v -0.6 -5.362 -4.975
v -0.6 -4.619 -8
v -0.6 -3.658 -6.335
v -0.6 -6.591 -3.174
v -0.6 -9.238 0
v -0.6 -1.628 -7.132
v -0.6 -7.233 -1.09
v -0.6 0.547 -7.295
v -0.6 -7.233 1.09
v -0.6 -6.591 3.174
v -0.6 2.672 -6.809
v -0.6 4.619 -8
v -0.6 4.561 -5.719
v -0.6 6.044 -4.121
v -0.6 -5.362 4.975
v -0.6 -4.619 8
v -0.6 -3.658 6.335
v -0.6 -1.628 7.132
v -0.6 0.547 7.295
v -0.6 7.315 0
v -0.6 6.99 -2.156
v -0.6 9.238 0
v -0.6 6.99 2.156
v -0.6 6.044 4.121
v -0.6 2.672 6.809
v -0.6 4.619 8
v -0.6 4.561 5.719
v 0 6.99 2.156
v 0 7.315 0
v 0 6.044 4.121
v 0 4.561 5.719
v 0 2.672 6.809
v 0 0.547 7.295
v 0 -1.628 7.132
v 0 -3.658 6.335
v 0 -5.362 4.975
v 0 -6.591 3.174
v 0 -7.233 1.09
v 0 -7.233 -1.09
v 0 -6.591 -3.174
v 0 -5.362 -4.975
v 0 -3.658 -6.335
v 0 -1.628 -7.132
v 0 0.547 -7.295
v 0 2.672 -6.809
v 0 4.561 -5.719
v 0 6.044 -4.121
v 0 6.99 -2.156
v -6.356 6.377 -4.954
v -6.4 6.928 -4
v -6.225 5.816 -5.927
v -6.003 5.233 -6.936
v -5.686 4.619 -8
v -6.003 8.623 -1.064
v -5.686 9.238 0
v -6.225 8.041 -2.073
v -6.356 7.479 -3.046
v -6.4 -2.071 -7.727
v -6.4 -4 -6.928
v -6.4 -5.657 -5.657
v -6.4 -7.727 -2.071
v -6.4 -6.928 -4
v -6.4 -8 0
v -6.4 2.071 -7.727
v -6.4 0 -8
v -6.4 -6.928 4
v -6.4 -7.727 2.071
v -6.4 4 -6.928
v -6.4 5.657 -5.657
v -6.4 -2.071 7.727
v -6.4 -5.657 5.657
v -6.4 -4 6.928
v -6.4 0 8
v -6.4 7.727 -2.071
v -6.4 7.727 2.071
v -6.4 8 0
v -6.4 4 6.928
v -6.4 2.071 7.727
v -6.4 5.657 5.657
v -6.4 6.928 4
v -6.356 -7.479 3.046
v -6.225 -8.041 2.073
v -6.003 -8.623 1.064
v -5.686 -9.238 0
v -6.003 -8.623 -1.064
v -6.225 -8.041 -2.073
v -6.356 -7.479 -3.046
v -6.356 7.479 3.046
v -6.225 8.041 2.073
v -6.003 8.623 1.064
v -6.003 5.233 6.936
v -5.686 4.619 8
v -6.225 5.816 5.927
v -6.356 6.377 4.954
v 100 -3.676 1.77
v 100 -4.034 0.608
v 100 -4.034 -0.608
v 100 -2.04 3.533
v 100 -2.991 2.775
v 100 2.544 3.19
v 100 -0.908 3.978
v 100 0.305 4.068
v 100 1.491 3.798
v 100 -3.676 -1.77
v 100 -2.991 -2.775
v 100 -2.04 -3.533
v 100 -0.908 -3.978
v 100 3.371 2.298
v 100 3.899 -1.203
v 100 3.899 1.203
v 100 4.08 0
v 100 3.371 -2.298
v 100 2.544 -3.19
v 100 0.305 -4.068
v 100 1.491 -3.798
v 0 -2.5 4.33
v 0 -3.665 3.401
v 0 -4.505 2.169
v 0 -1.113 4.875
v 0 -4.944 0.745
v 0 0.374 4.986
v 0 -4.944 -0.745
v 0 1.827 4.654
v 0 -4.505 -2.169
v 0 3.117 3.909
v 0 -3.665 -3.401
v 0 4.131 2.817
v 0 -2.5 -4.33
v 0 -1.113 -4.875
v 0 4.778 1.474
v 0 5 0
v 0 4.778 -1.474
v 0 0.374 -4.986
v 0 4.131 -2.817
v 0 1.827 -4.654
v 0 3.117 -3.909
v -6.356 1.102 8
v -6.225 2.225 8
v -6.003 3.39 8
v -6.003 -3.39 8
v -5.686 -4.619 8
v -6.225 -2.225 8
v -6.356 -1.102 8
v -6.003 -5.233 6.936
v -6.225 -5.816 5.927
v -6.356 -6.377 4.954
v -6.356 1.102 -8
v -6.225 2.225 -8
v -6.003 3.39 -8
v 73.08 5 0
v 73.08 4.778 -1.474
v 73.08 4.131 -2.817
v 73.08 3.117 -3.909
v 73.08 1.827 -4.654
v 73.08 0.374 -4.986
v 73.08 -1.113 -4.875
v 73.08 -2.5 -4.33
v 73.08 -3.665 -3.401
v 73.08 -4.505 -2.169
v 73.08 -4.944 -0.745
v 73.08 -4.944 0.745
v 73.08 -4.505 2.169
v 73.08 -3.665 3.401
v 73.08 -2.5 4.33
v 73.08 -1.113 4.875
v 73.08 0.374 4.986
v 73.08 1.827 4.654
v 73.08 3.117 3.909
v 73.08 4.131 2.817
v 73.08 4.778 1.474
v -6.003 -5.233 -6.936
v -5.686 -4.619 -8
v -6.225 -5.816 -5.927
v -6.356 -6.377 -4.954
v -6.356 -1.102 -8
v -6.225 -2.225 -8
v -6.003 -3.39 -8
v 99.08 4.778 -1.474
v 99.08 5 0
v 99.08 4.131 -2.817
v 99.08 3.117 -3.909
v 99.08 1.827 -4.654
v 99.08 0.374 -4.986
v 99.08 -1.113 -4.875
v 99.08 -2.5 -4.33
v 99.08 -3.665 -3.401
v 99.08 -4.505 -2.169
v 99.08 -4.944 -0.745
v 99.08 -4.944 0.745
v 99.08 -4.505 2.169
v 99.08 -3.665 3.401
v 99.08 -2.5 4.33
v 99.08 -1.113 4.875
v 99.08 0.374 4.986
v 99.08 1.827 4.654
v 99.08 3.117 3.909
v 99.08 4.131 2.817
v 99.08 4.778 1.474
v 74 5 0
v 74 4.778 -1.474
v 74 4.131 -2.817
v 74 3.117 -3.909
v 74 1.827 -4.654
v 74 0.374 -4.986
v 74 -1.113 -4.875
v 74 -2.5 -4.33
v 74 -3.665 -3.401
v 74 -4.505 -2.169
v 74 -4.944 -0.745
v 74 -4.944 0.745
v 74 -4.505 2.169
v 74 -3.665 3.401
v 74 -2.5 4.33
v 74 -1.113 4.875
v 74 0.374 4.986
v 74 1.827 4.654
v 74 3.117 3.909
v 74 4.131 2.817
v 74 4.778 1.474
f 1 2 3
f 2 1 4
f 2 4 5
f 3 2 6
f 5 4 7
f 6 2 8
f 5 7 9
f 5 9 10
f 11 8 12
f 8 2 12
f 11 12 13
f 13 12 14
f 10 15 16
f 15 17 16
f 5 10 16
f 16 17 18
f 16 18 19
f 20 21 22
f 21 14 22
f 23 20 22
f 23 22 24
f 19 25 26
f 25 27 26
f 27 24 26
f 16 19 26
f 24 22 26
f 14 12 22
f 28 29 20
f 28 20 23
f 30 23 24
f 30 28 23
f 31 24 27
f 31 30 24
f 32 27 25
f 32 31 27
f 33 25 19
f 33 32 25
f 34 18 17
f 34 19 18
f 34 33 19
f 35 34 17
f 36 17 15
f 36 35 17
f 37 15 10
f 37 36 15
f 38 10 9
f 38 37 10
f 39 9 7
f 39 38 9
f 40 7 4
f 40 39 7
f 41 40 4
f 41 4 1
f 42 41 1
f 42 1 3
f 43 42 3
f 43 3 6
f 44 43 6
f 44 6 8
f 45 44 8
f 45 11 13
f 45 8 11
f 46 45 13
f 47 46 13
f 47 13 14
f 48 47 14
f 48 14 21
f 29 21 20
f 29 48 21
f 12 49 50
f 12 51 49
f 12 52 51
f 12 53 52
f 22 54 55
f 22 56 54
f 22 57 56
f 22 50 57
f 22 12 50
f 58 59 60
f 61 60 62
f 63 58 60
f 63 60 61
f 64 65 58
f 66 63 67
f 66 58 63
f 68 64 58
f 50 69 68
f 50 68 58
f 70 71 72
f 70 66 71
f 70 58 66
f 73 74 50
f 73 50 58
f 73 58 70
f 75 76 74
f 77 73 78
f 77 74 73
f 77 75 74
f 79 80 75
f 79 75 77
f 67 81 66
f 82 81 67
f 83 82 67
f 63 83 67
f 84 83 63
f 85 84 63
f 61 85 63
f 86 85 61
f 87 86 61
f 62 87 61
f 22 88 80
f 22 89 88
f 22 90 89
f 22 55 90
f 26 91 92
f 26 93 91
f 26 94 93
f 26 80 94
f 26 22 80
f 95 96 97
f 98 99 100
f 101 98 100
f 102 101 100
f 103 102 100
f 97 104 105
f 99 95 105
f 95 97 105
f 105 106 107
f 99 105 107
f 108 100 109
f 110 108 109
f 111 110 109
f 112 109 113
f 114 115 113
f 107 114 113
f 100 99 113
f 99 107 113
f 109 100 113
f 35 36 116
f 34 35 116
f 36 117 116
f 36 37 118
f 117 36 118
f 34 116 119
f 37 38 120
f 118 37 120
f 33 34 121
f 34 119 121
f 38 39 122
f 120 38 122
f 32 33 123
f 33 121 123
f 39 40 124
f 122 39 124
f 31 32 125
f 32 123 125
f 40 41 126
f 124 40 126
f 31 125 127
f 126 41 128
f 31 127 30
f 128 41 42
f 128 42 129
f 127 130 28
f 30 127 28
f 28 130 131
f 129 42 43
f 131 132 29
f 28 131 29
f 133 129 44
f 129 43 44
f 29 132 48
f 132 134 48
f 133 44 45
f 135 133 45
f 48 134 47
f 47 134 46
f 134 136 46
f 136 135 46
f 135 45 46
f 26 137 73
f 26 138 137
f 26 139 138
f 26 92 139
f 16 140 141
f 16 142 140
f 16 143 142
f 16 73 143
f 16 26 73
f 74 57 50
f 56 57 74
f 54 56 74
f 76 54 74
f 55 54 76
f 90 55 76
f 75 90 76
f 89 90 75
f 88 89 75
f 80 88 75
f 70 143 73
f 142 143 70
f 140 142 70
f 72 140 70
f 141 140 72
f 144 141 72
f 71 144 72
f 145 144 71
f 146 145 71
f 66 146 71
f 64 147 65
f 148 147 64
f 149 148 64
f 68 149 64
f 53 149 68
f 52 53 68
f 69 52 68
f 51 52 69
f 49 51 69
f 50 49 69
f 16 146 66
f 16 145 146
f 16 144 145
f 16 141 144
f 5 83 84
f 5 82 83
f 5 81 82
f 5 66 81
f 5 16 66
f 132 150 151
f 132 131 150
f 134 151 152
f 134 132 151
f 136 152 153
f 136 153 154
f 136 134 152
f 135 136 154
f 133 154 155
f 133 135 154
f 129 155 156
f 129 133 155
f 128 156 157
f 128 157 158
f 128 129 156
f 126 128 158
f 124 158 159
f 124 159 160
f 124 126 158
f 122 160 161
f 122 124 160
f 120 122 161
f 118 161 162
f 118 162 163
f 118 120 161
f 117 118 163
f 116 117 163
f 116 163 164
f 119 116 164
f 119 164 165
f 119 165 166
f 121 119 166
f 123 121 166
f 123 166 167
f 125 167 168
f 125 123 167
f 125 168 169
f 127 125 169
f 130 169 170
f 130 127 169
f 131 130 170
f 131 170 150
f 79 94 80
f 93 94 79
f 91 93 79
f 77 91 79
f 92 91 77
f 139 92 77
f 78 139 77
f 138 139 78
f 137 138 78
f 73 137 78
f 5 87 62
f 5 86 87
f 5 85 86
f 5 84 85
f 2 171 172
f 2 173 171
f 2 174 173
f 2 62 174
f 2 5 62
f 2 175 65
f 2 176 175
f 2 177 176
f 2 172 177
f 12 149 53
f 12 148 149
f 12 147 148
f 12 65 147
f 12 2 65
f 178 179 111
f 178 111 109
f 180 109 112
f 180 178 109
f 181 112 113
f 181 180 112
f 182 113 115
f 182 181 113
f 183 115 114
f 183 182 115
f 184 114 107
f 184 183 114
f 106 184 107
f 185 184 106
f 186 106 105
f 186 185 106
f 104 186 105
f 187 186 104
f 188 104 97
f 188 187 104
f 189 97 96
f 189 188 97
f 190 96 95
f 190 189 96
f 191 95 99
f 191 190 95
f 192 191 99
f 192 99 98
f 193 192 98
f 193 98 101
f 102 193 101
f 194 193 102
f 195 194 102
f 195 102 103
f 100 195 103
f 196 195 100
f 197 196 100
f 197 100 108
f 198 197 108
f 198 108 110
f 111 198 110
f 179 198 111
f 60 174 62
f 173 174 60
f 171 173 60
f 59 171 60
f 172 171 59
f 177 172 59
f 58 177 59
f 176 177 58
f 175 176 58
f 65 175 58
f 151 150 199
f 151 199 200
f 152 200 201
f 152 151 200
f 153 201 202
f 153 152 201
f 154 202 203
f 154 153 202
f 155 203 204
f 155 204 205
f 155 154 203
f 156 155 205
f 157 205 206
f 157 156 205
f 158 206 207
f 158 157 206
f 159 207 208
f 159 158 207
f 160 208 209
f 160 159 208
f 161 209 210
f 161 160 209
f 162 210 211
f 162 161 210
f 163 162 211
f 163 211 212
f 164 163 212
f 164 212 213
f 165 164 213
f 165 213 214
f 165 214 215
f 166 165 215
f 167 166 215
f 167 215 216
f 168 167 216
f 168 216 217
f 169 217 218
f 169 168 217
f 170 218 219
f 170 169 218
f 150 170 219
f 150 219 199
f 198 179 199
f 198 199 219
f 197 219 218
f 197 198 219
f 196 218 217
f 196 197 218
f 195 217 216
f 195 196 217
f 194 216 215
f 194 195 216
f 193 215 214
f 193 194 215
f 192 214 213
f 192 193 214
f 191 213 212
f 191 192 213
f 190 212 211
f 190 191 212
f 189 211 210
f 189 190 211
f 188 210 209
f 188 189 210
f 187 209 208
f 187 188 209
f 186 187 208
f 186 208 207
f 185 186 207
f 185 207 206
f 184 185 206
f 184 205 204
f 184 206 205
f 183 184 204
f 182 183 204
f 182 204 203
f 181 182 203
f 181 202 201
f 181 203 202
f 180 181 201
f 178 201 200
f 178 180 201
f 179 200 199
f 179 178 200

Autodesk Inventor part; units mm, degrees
ref_plane "YZ Plane" through (0, 0, 0) normal (1, 0, 0) x (0, 1, 0)
ref_plane "XZ Plane" through (0, 0, 0) normal (0, 1, 0) x (-1, 0, 0)
sketch "Sketch1" plane through (0, 0, 0) normal (0, 0, 1) x (1, 0, 0)
  line L0 (0, 7.315) -> (0, 5)
  line L1 (74, 5) -> (100, 5)
  line L2 (100, 5) -> (100, 0)
  line L3 (100, 0) -> (-0.6001, 0)
  line L4 (-20.7201, 0) -> (120.12, 0) projected
  line L5 (-0.6001, 0) -> (-0.6001, 7.315)
  line L6 (-0.6001, 7.315) -> (0, 7.315)
  line L7 (74, 5) -> (73.0797, 5)
  line L8 (73.0797, 5) -> (0, 5)
  line L9 (0, -1.463) -> (0, 8.778) projected
  dimension "d0" = 100
  dimension "d1" = 26
  dimension "d2" = 10
  dimension "d9" = 0.6001
  dimension "d10" = 14.63
  dimension "d13" = 0.9203
  dimension "d14" = 10
revolve "Body" add sketch "Sketch1" angle 360 about axis through (100, 0, 0) along (-1, 0, 0)
sketch "Sketch2" plane through (-0.6001, 0, 0) normal (-1, 0, 0) x (0, 0, 1)
  line L0 (0, 9.2376) -> (8, 4.6188)
  line L1 (8, 4.6188) -> (8, -4.6188)
  line L2 (8, -4.6188) -> (0, -9.2376)
  line L3 (0, -9.2376) -> (-8, -4.6188)
  line L4 (-8, -4.6188) -> (-8, 4.6188)
  line L5 (-8, 4.6188) -> (0, 9.2376)
  point P0 (0, 0)
  point P1 (0, 0)
  dimension "d11" = 16
extrude "Head" add sketch "Sketch2" along normal blind 5.8
sketch "Sketch4" plane through (0, 0, 0) normal (0, 0, 1) x (1, 0, 0)
  line L0 (-6.4001, 8) -> (-6.4001, 9.2376)
  line L1 (-6.4001, 9.2376) -> (-5.6856, 9.2376)
  line L2 (-5.6856, 9.2376) -> (-6.4001, 8)
  line L3 (-7.5601, 0) -> (0.5599, 0) projected
  line L4 (-0.6001, 9.2376) -> (-6.4001, 9.2376) projected
  line L5 (-6.4001, 4.6188) -> (-6.4001, 9.2376) projected
  dimension "d5" = 30
  dimension "d19" = 16
revolve "Chamfer1" cut sketch "Sketch4" angle 360 about axis through (-10, 0, 0) along (1, 0, 0)
thread "Thread" size "M10x1.5" class "6g" standard "ISO Metric profile" length 26
chamfer "Chamfer2" distance 0.9202 distance2 0.9203 1 edges at (100, -5, 0) measured on face at (100, 1.175, -0.5081)
ref_plane "Work Plane1" through (1.525, 0, 0) normal (0, 0, 1) x (1, 0, 0)
equation "\"d11\" = SW"
equation "\"d3\" = KOH - SD"
equation "\"d15\" = GEL"
equation "\"d6\" = -0.5 * SPD + 0.5 * GD"
equation "\"d0\" = NLG"
equation "\"d1\" = GEL"
equation "\"d2\" = GD"
equation "\"d10\" = SD2"
equation "\"d14\" = BDM"
equation "\"d5\" = ANG1"
equation "\"d19\" = SW0"
equation "\"NLG\" = 100"
equation "\"GD\" = NND"
equation "\"BDM\" = NND"
equation "\"KOH\" = 6.4"
equation "\"GEL\" = 26"
equation "\"SW\" = 16"
equation "\"SW0\" = SW"
equation "\"SPD\" = NND - 1.2269 * PTC"
equation "\"SD2\" = 14.63"
equation "\"SD\" = 0.6"
equation "\"ANG1\" = 30deg"
equation "\"GAL\" = 0.61345 * PTC"
equation "\"GUL\" = 0.61345 * PTC"
equation "\"RR\" = 0.4"
equation "\"GD1\" = THREADDIA - 1.2269 * PTC"
equation "\"SDH\" = SD2"
equation "\"TOA\" = 30deg"
equation "\"PTC\" = 1.5"
equation "\"E0\" = 1.155 * SW"
equation "\"NND\" = 10"
equation "\"THREADDIA\" = 10"
properties part number "ISO 4014 - M10 x 100" material "Stainless Steel, 440C"
